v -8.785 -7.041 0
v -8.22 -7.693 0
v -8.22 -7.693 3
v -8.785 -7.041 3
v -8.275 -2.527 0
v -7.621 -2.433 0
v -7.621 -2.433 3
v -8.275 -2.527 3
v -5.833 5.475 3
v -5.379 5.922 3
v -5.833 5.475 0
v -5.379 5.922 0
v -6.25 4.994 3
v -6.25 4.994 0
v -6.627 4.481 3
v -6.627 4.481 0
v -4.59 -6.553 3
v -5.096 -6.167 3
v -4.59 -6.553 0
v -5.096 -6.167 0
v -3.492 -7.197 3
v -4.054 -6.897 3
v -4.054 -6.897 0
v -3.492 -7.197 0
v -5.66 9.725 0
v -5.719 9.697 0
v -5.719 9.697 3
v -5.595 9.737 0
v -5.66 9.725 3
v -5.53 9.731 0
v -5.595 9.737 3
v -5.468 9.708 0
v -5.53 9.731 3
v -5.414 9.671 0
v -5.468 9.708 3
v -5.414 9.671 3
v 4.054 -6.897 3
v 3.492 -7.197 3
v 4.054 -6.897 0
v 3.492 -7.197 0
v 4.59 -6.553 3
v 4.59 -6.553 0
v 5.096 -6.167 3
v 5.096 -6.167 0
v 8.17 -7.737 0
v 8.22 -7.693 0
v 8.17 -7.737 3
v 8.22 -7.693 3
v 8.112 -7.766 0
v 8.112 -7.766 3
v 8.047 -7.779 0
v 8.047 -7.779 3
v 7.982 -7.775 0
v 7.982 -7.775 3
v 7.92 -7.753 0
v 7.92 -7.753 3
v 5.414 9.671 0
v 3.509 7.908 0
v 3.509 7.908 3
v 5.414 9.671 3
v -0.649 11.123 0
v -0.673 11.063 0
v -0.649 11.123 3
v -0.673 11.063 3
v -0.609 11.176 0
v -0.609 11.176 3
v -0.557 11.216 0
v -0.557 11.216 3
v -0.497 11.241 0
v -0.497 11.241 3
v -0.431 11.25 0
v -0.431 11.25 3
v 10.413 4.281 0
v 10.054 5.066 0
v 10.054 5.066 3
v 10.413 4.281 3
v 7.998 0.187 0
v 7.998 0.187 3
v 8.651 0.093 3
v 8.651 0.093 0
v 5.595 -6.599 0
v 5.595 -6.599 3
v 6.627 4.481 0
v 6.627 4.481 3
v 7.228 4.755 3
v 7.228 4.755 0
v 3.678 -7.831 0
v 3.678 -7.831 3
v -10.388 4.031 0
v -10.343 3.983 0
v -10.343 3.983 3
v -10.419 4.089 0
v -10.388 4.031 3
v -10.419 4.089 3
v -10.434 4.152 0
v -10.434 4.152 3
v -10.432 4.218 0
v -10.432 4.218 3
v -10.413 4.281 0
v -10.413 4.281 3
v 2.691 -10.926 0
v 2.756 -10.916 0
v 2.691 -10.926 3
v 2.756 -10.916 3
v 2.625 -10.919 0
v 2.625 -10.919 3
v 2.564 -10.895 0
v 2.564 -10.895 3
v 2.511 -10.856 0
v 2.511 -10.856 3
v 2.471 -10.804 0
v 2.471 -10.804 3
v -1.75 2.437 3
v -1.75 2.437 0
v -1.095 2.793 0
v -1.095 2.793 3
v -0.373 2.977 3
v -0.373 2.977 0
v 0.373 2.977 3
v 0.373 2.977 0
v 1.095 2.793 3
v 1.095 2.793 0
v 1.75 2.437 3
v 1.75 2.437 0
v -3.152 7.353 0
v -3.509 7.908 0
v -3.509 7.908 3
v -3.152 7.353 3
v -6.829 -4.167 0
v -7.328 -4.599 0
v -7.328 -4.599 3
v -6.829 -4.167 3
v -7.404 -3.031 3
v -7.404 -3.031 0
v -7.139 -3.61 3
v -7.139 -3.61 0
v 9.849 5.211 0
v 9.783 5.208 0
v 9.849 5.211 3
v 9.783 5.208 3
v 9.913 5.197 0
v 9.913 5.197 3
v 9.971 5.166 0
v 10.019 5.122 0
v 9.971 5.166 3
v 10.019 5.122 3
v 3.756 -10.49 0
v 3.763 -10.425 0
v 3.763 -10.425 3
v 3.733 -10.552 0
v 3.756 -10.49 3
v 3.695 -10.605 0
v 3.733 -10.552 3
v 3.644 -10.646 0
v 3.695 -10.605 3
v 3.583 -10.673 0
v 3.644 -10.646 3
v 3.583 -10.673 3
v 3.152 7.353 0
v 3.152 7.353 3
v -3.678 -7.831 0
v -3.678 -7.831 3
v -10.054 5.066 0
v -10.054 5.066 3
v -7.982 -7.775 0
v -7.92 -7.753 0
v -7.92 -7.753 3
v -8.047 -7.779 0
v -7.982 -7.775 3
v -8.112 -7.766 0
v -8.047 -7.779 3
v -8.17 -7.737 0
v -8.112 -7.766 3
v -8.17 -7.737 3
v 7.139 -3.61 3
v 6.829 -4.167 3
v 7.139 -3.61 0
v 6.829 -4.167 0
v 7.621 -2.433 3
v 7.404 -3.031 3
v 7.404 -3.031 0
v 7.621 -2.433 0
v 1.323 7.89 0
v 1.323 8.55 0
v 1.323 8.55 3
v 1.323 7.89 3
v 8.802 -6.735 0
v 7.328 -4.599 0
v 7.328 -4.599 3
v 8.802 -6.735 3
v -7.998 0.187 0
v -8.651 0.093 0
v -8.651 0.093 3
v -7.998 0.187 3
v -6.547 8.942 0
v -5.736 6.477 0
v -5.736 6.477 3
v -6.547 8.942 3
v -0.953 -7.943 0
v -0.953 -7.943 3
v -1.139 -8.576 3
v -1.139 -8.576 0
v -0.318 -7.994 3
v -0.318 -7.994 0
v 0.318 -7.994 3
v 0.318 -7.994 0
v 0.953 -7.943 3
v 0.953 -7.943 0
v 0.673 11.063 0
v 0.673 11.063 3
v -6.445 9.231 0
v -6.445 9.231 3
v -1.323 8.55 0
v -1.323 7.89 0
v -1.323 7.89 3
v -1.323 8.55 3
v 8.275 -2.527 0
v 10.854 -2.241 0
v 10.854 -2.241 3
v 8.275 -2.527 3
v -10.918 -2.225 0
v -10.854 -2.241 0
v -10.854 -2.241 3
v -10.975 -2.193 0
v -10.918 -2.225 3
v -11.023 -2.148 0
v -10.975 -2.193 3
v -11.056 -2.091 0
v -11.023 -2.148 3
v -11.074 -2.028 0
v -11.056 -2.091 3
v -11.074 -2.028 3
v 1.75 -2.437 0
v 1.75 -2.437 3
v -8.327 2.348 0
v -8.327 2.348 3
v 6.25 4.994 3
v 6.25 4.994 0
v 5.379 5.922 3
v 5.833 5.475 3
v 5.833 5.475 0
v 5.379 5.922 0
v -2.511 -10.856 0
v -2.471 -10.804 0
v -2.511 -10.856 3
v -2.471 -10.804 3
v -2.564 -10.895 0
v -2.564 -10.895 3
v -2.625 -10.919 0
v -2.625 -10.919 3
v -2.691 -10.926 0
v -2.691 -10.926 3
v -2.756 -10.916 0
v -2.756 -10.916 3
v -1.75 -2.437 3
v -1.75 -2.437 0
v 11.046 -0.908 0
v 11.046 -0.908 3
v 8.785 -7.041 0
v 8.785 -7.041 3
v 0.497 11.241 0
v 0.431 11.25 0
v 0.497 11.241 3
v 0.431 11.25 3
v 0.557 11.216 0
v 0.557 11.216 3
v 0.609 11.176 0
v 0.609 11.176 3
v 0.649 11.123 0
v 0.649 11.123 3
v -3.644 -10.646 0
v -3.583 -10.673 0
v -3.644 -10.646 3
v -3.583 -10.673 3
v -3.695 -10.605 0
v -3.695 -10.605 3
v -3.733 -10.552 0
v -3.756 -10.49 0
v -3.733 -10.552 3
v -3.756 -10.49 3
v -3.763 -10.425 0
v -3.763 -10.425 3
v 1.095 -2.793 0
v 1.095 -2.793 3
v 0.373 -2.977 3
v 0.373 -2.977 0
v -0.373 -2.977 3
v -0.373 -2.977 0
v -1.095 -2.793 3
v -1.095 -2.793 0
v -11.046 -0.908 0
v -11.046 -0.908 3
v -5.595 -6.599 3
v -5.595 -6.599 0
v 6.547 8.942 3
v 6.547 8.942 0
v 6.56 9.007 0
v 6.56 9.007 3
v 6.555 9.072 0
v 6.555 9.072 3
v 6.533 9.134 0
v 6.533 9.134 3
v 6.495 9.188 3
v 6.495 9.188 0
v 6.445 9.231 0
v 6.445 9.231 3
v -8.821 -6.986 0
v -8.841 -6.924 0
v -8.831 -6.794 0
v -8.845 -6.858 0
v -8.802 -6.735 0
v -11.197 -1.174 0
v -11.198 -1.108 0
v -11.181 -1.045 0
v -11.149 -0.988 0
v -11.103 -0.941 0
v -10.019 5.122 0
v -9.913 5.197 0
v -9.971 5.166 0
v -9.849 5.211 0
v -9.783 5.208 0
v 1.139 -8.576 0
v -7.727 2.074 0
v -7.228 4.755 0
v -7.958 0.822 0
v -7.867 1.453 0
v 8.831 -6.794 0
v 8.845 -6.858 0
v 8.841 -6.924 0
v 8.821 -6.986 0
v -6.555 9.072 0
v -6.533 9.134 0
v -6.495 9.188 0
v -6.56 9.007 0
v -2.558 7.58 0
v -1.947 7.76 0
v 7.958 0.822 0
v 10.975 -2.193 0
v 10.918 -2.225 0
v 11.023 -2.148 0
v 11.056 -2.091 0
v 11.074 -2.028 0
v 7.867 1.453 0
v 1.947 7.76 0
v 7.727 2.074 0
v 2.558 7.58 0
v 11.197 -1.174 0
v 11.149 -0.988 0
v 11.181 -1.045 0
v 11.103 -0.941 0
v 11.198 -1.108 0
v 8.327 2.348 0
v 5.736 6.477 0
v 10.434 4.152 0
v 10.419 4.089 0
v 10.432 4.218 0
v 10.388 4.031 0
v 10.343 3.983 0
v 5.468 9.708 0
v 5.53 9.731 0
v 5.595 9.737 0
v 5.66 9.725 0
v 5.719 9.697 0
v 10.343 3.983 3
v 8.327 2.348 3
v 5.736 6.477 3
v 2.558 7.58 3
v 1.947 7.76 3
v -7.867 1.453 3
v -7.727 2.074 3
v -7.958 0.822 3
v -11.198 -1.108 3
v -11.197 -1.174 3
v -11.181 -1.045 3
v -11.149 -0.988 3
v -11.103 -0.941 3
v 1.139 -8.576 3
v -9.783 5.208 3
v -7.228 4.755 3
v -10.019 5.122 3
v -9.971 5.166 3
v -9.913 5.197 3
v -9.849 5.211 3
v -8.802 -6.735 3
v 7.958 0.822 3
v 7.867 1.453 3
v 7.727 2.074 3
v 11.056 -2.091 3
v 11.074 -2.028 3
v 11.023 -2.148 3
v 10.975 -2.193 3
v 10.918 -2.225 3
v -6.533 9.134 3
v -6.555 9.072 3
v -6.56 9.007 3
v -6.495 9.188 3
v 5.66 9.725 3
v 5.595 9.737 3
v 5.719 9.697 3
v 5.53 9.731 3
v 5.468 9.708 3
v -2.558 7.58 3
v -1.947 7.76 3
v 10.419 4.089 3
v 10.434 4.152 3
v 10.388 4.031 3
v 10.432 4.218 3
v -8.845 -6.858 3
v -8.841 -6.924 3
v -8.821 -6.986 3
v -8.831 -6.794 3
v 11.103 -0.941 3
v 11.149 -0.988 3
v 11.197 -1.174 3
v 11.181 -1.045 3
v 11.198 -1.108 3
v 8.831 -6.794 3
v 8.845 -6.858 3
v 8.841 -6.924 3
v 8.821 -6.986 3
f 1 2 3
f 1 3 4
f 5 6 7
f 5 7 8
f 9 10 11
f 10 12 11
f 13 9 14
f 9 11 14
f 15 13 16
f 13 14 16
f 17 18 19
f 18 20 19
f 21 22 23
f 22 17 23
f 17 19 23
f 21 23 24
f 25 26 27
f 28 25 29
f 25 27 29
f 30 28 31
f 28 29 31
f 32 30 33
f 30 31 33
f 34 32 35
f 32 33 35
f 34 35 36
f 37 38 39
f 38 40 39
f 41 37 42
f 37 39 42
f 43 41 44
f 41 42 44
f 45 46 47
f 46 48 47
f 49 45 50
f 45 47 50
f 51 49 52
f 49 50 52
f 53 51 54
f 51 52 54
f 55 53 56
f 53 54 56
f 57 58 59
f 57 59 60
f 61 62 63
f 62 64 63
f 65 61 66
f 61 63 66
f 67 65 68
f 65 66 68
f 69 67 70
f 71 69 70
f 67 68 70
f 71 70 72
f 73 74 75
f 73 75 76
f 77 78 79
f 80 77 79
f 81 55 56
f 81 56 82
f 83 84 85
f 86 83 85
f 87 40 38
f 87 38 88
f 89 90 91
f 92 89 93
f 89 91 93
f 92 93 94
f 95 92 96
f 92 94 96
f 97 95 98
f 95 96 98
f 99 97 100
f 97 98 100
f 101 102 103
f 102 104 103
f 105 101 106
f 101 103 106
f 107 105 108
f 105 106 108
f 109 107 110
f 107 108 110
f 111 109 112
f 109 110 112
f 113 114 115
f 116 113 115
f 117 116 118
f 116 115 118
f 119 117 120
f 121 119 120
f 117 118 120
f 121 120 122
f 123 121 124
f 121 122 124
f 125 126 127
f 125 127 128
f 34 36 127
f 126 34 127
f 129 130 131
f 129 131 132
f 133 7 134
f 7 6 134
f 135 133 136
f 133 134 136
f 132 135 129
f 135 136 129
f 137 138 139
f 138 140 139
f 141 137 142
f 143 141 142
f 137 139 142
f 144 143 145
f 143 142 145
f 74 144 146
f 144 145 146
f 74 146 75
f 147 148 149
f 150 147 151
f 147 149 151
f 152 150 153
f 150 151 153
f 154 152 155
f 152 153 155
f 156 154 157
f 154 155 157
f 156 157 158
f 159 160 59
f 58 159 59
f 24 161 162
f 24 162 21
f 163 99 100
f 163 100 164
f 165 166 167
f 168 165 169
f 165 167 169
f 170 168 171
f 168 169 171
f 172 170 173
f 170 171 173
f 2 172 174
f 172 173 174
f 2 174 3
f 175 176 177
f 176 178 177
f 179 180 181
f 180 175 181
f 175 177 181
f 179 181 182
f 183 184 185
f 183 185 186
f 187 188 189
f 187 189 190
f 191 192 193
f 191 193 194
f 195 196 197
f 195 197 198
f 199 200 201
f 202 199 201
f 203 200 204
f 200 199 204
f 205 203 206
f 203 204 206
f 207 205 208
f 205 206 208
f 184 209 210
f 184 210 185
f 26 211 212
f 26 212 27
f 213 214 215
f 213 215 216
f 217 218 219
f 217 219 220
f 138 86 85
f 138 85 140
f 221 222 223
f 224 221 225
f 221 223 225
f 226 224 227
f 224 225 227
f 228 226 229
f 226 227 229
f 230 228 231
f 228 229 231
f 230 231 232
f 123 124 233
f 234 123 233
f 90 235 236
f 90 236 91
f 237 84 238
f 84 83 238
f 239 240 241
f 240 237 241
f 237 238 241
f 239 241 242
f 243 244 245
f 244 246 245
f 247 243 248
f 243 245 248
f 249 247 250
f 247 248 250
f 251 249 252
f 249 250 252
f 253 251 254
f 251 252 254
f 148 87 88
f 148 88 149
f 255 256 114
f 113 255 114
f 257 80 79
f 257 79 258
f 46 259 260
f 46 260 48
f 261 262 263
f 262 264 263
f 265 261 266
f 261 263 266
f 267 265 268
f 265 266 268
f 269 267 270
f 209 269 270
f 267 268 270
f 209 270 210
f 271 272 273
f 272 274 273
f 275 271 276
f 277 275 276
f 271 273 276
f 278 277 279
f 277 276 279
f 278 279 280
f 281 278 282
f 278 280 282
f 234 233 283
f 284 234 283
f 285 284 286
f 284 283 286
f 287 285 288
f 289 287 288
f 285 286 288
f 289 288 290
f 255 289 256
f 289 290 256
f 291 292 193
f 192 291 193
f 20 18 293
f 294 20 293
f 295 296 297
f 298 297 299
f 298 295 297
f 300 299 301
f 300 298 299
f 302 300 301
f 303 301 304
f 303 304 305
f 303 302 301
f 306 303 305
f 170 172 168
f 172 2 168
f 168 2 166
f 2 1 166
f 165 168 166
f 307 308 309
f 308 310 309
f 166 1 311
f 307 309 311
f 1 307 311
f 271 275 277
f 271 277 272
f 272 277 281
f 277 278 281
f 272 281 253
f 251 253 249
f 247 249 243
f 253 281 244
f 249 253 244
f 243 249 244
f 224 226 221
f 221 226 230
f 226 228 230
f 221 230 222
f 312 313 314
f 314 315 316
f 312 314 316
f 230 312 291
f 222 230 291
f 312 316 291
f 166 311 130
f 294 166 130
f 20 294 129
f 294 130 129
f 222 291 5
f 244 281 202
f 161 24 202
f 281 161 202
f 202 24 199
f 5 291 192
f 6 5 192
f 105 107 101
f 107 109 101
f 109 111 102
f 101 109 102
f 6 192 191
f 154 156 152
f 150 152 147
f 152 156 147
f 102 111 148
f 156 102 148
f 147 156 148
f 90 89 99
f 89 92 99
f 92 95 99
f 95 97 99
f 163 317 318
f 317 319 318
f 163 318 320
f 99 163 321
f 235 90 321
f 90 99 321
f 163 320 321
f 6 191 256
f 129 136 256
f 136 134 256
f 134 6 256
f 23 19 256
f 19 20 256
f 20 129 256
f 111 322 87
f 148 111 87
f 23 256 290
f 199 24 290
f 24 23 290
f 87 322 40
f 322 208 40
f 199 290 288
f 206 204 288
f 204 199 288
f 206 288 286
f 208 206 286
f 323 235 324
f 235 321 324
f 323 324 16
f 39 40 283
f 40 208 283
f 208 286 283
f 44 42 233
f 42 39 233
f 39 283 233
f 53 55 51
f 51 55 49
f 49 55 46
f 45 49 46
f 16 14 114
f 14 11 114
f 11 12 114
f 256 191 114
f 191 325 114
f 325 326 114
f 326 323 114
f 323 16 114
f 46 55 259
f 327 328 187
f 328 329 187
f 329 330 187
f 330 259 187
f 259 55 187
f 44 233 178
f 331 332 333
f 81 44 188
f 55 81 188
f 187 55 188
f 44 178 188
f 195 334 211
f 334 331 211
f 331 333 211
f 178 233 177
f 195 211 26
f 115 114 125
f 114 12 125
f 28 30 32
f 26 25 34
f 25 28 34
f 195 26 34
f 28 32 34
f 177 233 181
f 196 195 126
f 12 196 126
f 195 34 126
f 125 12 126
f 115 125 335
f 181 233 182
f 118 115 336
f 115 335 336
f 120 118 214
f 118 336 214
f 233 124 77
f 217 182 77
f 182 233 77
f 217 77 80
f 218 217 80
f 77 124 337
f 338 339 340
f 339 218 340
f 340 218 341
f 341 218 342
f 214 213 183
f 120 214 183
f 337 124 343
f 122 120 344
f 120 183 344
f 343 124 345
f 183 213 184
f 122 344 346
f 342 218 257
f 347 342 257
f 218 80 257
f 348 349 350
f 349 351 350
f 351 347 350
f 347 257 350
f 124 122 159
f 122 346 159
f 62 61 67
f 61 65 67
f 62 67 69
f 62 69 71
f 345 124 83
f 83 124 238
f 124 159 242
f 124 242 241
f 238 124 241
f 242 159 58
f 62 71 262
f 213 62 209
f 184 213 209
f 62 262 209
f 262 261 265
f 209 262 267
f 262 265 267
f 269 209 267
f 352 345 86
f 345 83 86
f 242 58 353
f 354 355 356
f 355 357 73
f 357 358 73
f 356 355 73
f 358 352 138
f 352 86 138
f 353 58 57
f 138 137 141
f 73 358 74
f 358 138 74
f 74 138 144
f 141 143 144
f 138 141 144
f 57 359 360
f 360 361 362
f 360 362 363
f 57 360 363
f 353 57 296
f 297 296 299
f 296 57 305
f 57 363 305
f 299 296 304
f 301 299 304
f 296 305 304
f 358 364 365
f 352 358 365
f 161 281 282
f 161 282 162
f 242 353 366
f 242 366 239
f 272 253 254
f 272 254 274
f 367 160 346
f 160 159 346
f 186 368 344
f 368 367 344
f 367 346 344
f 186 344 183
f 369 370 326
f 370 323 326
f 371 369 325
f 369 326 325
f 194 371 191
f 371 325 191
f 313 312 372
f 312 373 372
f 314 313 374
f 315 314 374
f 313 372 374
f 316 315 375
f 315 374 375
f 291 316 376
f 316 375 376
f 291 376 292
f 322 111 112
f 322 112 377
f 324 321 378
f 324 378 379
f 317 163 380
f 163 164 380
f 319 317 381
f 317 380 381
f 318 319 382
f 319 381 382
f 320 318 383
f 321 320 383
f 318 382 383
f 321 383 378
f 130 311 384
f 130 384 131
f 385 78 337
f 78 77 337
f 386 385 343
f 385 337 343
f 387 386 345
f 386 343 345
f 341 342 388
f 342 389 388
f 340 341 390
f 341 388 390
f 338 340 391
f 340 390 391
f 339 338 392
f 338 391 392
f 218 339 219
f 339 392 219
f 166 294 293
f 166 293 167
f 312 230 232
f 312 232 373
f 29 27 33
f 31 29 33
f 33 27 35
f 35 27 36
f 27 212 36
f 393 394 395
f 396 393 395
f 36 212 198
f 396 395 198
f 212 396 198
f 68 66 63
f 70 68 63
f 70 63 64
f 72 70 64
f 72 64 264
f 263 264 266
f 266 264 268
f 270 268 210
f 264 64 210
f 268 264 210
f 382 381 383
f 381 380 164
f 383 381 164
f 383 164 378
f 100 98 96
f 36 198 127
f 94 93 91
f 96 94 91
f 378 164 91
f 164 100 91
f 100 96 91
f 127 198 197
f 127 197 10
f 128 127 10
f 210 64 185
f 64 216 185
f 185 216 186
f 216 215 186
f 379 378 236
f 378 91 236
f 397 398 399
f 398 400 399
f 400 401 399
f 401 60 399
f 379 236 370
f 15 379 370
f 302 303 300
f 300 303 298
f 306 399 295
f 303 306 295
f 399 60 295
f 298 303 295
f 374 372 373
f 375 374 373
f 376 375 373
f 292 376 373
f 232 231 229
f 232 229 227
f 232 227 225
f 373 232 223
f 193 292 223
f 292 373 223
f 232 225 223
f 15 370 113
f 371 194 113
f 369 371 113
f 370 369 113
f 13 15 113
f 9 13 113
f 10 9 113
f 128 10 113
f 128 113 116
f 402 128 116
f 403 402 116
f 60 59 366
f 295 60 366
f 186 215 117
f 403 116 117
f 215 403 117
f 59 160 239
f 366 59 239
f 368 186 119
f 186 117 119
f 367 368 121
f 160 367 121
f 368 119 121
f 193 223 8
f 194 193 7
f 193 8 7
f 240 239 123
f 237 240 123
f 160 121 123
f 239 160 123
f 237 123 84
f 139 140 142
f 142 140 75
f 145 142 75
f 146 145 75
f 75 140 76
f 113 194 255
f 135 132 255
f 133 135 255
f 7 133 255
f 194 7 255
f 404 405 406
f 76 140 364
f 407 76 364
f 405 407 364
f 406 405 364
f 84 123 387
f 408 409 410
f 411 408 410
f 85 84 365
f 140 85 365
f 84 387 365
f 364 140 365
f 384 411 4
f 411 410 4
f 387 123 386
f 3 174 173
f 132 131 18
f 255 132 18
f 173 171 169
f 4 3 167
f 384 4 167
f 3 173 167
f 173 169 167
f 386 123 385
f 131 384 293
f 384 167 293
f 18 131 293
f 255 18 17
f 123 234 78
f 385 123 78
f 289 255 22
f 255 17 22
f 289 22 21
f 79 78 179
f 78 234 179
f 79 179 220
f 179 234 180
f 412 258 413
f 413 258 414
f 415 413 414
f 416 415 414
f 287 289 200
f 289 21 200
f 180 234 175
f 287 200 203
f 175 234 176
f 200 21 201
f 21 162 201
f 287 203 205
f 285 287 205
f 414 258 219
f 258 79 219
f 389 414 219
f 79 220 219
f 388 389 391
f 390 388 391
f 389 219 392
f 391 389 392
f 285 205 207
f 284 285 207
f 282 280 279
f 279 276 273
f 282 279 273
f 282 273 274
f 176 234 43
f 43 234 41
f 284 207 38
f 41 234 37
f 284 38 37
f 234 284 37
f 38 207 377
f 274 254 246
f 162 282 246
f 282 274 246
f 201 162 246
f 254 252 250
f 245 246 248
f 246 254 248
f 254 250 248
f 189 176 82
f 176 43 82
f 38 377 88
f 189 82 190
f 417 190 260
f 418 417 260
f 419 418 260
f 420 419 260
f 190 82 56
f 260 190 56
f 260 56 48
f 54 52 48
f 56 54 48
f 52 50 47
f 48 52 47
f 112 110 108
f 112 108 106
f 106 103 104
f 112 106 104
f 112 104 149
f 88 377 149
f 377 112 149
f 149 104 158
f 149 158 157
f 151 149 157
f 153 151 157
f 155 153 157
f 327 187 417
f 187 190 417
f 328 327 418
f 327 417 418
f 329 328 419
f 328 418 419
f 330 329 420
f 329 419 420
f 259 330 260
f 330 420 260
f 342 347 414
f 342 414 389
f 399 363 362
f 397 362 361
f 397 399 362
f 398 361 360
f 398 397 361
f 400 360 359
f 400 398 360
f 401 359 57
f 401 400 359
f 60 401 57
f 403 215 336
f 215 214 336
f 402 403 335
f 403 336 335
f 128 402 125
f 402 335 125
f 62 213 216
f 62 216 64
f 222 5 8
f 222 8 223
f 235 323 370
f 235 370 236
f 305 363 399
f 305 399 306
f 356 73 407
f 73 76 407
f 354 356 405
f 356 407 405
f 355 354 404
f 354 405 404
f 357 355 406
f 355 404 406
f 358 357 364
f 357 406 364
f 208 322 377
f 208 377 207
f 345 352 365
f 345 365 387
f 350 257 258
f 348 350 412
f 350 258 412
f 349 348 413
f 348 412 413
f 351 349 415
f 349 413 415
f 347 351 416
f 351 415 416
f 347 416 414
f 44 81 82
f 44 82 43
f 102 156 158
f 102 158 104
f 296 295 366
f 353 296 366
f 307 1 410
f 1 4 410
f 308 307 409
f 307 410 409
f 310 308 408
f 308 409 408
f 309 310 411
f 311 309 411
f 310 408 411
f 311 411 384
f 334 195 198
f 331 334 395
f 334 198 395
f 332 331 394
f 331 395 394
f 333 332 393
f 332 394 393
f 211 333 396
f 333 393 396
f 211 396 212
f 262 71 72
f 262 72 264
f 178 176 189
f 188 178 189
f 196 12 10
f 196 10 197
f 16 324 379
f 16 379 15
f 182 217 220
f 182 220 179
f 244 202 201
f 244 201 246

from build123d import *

# Parameters (mm, degrees)
SKETCH1_R                = 8
BOSS_EXTRUDE1_DEPTH      = 3
BOSS_EXTRUDE2_DEPTH      = 3
FILLET1_R                = 0.25
CIRPATTERN1_COUNT        = 11
FILLET1_OF_CIRPATTERN1_R = 0.25


with BuildPart() as part:
    # Sketch1 → Boss-Extrude1 (new body)
    with BuildSketch(Plane.XY):
        Circle(SKETCH1_R)
        with BuildLine():
            ThreePointArc((1.75, -2.436698586), (0, -3), (-1.75, -2.436698586))
            Line((-1.75, -2.436698586), (-1.75, 2.436698586))
            ThreePointArc((-1.75, 2.436698586), (0, 3), (1.75, 2.436698586))
            Line((1.75, 2.436698586), (1.75, -2.436698586))
        make_face(mode=Mode.SUBTRACT)
    extrude(amount=BOSS_EXTRUDE1_DEPTH)

    # Sketch2 → Boss-Extrude2 (add)
    with BuildSketch(Plane.XY):
        Polygon((-1.323267478, 7.75), (-1.323267478, 8.55), (-0.625, 11.25), (0.625, 11.25), (1.323267478, 8.55), (1.323267478, 7.75), align=None)
    boss_extrude2 = extrude(amount=BOSS_EXTRUDE2_DEPTH)

    # Fillet1
    fillet1_edges = [part.edges().sort_by_distance(p)[0] for p in [
        (0.625, 11.25, 1.5),
        (-0.625, 11.25, 1.5),
    ]]
    fillet(fillet1_edges, radius=FILLET1_R)

    # CirPattern1: Boss-Extrude2 ×11 about axis
    cirpattern1_axis = Axis((0, 0, 0), (0, 0, 1))
    for i in range(1, CIRPATTERN1_COUNT):
        add(boss_extrude2.rotate(cirpattern1_axis, i * 360 / CIRPATTERN1_COUNT))

    # Fillet1 of CirPattern1
    fillet1_of_cirpattern1_edges = [part.edges().sort_by_distance(p)[0] for p in [
        (-5.556425738, 9.802002755, 1.5),
        (-6.607992654, 9.126201733, 1.5),
        (-9.973725565, 5.241938893, 1.5),
        (-10.492994331, 4.104898899, 1.5),
        (-11.224437995, -0.982403529, 1.5),
        (-11.046544447, -2.219680332, 1.5),
        (-8.91147067, -6.894839773, 1.5),
        (-8.092894753, -7.839526741, 1.5),
        (-3.769174373, -10.618213105, 1.5),
        (-2.569808156, -10.970378801, 1.5),
        (2.569808156, -10.970378801, 1.5),
        (3.769174373, -10.618213105, 1.5),
        (8.092894753, -7.839526741, 1.5),
        (8.91147067, -6.894839773, 1.5),
        (11.046544447, -2.219680332, 1.5),
        (11.224437995, -0.982403529, 1.5),
        (10.492994331, 4.104898899, 1.5),
        (9.973725565, 5.241938893, 1.5),
        (6.607992654, 9.126201733, 1.5),
        (5.556425738, 9.802002755, 1.5),
    ]]
    fillet(fillet1_of_cirpattern1_edges, radius=FILLET1_OF_CIRPATTERN1_R)


solid = part.part
